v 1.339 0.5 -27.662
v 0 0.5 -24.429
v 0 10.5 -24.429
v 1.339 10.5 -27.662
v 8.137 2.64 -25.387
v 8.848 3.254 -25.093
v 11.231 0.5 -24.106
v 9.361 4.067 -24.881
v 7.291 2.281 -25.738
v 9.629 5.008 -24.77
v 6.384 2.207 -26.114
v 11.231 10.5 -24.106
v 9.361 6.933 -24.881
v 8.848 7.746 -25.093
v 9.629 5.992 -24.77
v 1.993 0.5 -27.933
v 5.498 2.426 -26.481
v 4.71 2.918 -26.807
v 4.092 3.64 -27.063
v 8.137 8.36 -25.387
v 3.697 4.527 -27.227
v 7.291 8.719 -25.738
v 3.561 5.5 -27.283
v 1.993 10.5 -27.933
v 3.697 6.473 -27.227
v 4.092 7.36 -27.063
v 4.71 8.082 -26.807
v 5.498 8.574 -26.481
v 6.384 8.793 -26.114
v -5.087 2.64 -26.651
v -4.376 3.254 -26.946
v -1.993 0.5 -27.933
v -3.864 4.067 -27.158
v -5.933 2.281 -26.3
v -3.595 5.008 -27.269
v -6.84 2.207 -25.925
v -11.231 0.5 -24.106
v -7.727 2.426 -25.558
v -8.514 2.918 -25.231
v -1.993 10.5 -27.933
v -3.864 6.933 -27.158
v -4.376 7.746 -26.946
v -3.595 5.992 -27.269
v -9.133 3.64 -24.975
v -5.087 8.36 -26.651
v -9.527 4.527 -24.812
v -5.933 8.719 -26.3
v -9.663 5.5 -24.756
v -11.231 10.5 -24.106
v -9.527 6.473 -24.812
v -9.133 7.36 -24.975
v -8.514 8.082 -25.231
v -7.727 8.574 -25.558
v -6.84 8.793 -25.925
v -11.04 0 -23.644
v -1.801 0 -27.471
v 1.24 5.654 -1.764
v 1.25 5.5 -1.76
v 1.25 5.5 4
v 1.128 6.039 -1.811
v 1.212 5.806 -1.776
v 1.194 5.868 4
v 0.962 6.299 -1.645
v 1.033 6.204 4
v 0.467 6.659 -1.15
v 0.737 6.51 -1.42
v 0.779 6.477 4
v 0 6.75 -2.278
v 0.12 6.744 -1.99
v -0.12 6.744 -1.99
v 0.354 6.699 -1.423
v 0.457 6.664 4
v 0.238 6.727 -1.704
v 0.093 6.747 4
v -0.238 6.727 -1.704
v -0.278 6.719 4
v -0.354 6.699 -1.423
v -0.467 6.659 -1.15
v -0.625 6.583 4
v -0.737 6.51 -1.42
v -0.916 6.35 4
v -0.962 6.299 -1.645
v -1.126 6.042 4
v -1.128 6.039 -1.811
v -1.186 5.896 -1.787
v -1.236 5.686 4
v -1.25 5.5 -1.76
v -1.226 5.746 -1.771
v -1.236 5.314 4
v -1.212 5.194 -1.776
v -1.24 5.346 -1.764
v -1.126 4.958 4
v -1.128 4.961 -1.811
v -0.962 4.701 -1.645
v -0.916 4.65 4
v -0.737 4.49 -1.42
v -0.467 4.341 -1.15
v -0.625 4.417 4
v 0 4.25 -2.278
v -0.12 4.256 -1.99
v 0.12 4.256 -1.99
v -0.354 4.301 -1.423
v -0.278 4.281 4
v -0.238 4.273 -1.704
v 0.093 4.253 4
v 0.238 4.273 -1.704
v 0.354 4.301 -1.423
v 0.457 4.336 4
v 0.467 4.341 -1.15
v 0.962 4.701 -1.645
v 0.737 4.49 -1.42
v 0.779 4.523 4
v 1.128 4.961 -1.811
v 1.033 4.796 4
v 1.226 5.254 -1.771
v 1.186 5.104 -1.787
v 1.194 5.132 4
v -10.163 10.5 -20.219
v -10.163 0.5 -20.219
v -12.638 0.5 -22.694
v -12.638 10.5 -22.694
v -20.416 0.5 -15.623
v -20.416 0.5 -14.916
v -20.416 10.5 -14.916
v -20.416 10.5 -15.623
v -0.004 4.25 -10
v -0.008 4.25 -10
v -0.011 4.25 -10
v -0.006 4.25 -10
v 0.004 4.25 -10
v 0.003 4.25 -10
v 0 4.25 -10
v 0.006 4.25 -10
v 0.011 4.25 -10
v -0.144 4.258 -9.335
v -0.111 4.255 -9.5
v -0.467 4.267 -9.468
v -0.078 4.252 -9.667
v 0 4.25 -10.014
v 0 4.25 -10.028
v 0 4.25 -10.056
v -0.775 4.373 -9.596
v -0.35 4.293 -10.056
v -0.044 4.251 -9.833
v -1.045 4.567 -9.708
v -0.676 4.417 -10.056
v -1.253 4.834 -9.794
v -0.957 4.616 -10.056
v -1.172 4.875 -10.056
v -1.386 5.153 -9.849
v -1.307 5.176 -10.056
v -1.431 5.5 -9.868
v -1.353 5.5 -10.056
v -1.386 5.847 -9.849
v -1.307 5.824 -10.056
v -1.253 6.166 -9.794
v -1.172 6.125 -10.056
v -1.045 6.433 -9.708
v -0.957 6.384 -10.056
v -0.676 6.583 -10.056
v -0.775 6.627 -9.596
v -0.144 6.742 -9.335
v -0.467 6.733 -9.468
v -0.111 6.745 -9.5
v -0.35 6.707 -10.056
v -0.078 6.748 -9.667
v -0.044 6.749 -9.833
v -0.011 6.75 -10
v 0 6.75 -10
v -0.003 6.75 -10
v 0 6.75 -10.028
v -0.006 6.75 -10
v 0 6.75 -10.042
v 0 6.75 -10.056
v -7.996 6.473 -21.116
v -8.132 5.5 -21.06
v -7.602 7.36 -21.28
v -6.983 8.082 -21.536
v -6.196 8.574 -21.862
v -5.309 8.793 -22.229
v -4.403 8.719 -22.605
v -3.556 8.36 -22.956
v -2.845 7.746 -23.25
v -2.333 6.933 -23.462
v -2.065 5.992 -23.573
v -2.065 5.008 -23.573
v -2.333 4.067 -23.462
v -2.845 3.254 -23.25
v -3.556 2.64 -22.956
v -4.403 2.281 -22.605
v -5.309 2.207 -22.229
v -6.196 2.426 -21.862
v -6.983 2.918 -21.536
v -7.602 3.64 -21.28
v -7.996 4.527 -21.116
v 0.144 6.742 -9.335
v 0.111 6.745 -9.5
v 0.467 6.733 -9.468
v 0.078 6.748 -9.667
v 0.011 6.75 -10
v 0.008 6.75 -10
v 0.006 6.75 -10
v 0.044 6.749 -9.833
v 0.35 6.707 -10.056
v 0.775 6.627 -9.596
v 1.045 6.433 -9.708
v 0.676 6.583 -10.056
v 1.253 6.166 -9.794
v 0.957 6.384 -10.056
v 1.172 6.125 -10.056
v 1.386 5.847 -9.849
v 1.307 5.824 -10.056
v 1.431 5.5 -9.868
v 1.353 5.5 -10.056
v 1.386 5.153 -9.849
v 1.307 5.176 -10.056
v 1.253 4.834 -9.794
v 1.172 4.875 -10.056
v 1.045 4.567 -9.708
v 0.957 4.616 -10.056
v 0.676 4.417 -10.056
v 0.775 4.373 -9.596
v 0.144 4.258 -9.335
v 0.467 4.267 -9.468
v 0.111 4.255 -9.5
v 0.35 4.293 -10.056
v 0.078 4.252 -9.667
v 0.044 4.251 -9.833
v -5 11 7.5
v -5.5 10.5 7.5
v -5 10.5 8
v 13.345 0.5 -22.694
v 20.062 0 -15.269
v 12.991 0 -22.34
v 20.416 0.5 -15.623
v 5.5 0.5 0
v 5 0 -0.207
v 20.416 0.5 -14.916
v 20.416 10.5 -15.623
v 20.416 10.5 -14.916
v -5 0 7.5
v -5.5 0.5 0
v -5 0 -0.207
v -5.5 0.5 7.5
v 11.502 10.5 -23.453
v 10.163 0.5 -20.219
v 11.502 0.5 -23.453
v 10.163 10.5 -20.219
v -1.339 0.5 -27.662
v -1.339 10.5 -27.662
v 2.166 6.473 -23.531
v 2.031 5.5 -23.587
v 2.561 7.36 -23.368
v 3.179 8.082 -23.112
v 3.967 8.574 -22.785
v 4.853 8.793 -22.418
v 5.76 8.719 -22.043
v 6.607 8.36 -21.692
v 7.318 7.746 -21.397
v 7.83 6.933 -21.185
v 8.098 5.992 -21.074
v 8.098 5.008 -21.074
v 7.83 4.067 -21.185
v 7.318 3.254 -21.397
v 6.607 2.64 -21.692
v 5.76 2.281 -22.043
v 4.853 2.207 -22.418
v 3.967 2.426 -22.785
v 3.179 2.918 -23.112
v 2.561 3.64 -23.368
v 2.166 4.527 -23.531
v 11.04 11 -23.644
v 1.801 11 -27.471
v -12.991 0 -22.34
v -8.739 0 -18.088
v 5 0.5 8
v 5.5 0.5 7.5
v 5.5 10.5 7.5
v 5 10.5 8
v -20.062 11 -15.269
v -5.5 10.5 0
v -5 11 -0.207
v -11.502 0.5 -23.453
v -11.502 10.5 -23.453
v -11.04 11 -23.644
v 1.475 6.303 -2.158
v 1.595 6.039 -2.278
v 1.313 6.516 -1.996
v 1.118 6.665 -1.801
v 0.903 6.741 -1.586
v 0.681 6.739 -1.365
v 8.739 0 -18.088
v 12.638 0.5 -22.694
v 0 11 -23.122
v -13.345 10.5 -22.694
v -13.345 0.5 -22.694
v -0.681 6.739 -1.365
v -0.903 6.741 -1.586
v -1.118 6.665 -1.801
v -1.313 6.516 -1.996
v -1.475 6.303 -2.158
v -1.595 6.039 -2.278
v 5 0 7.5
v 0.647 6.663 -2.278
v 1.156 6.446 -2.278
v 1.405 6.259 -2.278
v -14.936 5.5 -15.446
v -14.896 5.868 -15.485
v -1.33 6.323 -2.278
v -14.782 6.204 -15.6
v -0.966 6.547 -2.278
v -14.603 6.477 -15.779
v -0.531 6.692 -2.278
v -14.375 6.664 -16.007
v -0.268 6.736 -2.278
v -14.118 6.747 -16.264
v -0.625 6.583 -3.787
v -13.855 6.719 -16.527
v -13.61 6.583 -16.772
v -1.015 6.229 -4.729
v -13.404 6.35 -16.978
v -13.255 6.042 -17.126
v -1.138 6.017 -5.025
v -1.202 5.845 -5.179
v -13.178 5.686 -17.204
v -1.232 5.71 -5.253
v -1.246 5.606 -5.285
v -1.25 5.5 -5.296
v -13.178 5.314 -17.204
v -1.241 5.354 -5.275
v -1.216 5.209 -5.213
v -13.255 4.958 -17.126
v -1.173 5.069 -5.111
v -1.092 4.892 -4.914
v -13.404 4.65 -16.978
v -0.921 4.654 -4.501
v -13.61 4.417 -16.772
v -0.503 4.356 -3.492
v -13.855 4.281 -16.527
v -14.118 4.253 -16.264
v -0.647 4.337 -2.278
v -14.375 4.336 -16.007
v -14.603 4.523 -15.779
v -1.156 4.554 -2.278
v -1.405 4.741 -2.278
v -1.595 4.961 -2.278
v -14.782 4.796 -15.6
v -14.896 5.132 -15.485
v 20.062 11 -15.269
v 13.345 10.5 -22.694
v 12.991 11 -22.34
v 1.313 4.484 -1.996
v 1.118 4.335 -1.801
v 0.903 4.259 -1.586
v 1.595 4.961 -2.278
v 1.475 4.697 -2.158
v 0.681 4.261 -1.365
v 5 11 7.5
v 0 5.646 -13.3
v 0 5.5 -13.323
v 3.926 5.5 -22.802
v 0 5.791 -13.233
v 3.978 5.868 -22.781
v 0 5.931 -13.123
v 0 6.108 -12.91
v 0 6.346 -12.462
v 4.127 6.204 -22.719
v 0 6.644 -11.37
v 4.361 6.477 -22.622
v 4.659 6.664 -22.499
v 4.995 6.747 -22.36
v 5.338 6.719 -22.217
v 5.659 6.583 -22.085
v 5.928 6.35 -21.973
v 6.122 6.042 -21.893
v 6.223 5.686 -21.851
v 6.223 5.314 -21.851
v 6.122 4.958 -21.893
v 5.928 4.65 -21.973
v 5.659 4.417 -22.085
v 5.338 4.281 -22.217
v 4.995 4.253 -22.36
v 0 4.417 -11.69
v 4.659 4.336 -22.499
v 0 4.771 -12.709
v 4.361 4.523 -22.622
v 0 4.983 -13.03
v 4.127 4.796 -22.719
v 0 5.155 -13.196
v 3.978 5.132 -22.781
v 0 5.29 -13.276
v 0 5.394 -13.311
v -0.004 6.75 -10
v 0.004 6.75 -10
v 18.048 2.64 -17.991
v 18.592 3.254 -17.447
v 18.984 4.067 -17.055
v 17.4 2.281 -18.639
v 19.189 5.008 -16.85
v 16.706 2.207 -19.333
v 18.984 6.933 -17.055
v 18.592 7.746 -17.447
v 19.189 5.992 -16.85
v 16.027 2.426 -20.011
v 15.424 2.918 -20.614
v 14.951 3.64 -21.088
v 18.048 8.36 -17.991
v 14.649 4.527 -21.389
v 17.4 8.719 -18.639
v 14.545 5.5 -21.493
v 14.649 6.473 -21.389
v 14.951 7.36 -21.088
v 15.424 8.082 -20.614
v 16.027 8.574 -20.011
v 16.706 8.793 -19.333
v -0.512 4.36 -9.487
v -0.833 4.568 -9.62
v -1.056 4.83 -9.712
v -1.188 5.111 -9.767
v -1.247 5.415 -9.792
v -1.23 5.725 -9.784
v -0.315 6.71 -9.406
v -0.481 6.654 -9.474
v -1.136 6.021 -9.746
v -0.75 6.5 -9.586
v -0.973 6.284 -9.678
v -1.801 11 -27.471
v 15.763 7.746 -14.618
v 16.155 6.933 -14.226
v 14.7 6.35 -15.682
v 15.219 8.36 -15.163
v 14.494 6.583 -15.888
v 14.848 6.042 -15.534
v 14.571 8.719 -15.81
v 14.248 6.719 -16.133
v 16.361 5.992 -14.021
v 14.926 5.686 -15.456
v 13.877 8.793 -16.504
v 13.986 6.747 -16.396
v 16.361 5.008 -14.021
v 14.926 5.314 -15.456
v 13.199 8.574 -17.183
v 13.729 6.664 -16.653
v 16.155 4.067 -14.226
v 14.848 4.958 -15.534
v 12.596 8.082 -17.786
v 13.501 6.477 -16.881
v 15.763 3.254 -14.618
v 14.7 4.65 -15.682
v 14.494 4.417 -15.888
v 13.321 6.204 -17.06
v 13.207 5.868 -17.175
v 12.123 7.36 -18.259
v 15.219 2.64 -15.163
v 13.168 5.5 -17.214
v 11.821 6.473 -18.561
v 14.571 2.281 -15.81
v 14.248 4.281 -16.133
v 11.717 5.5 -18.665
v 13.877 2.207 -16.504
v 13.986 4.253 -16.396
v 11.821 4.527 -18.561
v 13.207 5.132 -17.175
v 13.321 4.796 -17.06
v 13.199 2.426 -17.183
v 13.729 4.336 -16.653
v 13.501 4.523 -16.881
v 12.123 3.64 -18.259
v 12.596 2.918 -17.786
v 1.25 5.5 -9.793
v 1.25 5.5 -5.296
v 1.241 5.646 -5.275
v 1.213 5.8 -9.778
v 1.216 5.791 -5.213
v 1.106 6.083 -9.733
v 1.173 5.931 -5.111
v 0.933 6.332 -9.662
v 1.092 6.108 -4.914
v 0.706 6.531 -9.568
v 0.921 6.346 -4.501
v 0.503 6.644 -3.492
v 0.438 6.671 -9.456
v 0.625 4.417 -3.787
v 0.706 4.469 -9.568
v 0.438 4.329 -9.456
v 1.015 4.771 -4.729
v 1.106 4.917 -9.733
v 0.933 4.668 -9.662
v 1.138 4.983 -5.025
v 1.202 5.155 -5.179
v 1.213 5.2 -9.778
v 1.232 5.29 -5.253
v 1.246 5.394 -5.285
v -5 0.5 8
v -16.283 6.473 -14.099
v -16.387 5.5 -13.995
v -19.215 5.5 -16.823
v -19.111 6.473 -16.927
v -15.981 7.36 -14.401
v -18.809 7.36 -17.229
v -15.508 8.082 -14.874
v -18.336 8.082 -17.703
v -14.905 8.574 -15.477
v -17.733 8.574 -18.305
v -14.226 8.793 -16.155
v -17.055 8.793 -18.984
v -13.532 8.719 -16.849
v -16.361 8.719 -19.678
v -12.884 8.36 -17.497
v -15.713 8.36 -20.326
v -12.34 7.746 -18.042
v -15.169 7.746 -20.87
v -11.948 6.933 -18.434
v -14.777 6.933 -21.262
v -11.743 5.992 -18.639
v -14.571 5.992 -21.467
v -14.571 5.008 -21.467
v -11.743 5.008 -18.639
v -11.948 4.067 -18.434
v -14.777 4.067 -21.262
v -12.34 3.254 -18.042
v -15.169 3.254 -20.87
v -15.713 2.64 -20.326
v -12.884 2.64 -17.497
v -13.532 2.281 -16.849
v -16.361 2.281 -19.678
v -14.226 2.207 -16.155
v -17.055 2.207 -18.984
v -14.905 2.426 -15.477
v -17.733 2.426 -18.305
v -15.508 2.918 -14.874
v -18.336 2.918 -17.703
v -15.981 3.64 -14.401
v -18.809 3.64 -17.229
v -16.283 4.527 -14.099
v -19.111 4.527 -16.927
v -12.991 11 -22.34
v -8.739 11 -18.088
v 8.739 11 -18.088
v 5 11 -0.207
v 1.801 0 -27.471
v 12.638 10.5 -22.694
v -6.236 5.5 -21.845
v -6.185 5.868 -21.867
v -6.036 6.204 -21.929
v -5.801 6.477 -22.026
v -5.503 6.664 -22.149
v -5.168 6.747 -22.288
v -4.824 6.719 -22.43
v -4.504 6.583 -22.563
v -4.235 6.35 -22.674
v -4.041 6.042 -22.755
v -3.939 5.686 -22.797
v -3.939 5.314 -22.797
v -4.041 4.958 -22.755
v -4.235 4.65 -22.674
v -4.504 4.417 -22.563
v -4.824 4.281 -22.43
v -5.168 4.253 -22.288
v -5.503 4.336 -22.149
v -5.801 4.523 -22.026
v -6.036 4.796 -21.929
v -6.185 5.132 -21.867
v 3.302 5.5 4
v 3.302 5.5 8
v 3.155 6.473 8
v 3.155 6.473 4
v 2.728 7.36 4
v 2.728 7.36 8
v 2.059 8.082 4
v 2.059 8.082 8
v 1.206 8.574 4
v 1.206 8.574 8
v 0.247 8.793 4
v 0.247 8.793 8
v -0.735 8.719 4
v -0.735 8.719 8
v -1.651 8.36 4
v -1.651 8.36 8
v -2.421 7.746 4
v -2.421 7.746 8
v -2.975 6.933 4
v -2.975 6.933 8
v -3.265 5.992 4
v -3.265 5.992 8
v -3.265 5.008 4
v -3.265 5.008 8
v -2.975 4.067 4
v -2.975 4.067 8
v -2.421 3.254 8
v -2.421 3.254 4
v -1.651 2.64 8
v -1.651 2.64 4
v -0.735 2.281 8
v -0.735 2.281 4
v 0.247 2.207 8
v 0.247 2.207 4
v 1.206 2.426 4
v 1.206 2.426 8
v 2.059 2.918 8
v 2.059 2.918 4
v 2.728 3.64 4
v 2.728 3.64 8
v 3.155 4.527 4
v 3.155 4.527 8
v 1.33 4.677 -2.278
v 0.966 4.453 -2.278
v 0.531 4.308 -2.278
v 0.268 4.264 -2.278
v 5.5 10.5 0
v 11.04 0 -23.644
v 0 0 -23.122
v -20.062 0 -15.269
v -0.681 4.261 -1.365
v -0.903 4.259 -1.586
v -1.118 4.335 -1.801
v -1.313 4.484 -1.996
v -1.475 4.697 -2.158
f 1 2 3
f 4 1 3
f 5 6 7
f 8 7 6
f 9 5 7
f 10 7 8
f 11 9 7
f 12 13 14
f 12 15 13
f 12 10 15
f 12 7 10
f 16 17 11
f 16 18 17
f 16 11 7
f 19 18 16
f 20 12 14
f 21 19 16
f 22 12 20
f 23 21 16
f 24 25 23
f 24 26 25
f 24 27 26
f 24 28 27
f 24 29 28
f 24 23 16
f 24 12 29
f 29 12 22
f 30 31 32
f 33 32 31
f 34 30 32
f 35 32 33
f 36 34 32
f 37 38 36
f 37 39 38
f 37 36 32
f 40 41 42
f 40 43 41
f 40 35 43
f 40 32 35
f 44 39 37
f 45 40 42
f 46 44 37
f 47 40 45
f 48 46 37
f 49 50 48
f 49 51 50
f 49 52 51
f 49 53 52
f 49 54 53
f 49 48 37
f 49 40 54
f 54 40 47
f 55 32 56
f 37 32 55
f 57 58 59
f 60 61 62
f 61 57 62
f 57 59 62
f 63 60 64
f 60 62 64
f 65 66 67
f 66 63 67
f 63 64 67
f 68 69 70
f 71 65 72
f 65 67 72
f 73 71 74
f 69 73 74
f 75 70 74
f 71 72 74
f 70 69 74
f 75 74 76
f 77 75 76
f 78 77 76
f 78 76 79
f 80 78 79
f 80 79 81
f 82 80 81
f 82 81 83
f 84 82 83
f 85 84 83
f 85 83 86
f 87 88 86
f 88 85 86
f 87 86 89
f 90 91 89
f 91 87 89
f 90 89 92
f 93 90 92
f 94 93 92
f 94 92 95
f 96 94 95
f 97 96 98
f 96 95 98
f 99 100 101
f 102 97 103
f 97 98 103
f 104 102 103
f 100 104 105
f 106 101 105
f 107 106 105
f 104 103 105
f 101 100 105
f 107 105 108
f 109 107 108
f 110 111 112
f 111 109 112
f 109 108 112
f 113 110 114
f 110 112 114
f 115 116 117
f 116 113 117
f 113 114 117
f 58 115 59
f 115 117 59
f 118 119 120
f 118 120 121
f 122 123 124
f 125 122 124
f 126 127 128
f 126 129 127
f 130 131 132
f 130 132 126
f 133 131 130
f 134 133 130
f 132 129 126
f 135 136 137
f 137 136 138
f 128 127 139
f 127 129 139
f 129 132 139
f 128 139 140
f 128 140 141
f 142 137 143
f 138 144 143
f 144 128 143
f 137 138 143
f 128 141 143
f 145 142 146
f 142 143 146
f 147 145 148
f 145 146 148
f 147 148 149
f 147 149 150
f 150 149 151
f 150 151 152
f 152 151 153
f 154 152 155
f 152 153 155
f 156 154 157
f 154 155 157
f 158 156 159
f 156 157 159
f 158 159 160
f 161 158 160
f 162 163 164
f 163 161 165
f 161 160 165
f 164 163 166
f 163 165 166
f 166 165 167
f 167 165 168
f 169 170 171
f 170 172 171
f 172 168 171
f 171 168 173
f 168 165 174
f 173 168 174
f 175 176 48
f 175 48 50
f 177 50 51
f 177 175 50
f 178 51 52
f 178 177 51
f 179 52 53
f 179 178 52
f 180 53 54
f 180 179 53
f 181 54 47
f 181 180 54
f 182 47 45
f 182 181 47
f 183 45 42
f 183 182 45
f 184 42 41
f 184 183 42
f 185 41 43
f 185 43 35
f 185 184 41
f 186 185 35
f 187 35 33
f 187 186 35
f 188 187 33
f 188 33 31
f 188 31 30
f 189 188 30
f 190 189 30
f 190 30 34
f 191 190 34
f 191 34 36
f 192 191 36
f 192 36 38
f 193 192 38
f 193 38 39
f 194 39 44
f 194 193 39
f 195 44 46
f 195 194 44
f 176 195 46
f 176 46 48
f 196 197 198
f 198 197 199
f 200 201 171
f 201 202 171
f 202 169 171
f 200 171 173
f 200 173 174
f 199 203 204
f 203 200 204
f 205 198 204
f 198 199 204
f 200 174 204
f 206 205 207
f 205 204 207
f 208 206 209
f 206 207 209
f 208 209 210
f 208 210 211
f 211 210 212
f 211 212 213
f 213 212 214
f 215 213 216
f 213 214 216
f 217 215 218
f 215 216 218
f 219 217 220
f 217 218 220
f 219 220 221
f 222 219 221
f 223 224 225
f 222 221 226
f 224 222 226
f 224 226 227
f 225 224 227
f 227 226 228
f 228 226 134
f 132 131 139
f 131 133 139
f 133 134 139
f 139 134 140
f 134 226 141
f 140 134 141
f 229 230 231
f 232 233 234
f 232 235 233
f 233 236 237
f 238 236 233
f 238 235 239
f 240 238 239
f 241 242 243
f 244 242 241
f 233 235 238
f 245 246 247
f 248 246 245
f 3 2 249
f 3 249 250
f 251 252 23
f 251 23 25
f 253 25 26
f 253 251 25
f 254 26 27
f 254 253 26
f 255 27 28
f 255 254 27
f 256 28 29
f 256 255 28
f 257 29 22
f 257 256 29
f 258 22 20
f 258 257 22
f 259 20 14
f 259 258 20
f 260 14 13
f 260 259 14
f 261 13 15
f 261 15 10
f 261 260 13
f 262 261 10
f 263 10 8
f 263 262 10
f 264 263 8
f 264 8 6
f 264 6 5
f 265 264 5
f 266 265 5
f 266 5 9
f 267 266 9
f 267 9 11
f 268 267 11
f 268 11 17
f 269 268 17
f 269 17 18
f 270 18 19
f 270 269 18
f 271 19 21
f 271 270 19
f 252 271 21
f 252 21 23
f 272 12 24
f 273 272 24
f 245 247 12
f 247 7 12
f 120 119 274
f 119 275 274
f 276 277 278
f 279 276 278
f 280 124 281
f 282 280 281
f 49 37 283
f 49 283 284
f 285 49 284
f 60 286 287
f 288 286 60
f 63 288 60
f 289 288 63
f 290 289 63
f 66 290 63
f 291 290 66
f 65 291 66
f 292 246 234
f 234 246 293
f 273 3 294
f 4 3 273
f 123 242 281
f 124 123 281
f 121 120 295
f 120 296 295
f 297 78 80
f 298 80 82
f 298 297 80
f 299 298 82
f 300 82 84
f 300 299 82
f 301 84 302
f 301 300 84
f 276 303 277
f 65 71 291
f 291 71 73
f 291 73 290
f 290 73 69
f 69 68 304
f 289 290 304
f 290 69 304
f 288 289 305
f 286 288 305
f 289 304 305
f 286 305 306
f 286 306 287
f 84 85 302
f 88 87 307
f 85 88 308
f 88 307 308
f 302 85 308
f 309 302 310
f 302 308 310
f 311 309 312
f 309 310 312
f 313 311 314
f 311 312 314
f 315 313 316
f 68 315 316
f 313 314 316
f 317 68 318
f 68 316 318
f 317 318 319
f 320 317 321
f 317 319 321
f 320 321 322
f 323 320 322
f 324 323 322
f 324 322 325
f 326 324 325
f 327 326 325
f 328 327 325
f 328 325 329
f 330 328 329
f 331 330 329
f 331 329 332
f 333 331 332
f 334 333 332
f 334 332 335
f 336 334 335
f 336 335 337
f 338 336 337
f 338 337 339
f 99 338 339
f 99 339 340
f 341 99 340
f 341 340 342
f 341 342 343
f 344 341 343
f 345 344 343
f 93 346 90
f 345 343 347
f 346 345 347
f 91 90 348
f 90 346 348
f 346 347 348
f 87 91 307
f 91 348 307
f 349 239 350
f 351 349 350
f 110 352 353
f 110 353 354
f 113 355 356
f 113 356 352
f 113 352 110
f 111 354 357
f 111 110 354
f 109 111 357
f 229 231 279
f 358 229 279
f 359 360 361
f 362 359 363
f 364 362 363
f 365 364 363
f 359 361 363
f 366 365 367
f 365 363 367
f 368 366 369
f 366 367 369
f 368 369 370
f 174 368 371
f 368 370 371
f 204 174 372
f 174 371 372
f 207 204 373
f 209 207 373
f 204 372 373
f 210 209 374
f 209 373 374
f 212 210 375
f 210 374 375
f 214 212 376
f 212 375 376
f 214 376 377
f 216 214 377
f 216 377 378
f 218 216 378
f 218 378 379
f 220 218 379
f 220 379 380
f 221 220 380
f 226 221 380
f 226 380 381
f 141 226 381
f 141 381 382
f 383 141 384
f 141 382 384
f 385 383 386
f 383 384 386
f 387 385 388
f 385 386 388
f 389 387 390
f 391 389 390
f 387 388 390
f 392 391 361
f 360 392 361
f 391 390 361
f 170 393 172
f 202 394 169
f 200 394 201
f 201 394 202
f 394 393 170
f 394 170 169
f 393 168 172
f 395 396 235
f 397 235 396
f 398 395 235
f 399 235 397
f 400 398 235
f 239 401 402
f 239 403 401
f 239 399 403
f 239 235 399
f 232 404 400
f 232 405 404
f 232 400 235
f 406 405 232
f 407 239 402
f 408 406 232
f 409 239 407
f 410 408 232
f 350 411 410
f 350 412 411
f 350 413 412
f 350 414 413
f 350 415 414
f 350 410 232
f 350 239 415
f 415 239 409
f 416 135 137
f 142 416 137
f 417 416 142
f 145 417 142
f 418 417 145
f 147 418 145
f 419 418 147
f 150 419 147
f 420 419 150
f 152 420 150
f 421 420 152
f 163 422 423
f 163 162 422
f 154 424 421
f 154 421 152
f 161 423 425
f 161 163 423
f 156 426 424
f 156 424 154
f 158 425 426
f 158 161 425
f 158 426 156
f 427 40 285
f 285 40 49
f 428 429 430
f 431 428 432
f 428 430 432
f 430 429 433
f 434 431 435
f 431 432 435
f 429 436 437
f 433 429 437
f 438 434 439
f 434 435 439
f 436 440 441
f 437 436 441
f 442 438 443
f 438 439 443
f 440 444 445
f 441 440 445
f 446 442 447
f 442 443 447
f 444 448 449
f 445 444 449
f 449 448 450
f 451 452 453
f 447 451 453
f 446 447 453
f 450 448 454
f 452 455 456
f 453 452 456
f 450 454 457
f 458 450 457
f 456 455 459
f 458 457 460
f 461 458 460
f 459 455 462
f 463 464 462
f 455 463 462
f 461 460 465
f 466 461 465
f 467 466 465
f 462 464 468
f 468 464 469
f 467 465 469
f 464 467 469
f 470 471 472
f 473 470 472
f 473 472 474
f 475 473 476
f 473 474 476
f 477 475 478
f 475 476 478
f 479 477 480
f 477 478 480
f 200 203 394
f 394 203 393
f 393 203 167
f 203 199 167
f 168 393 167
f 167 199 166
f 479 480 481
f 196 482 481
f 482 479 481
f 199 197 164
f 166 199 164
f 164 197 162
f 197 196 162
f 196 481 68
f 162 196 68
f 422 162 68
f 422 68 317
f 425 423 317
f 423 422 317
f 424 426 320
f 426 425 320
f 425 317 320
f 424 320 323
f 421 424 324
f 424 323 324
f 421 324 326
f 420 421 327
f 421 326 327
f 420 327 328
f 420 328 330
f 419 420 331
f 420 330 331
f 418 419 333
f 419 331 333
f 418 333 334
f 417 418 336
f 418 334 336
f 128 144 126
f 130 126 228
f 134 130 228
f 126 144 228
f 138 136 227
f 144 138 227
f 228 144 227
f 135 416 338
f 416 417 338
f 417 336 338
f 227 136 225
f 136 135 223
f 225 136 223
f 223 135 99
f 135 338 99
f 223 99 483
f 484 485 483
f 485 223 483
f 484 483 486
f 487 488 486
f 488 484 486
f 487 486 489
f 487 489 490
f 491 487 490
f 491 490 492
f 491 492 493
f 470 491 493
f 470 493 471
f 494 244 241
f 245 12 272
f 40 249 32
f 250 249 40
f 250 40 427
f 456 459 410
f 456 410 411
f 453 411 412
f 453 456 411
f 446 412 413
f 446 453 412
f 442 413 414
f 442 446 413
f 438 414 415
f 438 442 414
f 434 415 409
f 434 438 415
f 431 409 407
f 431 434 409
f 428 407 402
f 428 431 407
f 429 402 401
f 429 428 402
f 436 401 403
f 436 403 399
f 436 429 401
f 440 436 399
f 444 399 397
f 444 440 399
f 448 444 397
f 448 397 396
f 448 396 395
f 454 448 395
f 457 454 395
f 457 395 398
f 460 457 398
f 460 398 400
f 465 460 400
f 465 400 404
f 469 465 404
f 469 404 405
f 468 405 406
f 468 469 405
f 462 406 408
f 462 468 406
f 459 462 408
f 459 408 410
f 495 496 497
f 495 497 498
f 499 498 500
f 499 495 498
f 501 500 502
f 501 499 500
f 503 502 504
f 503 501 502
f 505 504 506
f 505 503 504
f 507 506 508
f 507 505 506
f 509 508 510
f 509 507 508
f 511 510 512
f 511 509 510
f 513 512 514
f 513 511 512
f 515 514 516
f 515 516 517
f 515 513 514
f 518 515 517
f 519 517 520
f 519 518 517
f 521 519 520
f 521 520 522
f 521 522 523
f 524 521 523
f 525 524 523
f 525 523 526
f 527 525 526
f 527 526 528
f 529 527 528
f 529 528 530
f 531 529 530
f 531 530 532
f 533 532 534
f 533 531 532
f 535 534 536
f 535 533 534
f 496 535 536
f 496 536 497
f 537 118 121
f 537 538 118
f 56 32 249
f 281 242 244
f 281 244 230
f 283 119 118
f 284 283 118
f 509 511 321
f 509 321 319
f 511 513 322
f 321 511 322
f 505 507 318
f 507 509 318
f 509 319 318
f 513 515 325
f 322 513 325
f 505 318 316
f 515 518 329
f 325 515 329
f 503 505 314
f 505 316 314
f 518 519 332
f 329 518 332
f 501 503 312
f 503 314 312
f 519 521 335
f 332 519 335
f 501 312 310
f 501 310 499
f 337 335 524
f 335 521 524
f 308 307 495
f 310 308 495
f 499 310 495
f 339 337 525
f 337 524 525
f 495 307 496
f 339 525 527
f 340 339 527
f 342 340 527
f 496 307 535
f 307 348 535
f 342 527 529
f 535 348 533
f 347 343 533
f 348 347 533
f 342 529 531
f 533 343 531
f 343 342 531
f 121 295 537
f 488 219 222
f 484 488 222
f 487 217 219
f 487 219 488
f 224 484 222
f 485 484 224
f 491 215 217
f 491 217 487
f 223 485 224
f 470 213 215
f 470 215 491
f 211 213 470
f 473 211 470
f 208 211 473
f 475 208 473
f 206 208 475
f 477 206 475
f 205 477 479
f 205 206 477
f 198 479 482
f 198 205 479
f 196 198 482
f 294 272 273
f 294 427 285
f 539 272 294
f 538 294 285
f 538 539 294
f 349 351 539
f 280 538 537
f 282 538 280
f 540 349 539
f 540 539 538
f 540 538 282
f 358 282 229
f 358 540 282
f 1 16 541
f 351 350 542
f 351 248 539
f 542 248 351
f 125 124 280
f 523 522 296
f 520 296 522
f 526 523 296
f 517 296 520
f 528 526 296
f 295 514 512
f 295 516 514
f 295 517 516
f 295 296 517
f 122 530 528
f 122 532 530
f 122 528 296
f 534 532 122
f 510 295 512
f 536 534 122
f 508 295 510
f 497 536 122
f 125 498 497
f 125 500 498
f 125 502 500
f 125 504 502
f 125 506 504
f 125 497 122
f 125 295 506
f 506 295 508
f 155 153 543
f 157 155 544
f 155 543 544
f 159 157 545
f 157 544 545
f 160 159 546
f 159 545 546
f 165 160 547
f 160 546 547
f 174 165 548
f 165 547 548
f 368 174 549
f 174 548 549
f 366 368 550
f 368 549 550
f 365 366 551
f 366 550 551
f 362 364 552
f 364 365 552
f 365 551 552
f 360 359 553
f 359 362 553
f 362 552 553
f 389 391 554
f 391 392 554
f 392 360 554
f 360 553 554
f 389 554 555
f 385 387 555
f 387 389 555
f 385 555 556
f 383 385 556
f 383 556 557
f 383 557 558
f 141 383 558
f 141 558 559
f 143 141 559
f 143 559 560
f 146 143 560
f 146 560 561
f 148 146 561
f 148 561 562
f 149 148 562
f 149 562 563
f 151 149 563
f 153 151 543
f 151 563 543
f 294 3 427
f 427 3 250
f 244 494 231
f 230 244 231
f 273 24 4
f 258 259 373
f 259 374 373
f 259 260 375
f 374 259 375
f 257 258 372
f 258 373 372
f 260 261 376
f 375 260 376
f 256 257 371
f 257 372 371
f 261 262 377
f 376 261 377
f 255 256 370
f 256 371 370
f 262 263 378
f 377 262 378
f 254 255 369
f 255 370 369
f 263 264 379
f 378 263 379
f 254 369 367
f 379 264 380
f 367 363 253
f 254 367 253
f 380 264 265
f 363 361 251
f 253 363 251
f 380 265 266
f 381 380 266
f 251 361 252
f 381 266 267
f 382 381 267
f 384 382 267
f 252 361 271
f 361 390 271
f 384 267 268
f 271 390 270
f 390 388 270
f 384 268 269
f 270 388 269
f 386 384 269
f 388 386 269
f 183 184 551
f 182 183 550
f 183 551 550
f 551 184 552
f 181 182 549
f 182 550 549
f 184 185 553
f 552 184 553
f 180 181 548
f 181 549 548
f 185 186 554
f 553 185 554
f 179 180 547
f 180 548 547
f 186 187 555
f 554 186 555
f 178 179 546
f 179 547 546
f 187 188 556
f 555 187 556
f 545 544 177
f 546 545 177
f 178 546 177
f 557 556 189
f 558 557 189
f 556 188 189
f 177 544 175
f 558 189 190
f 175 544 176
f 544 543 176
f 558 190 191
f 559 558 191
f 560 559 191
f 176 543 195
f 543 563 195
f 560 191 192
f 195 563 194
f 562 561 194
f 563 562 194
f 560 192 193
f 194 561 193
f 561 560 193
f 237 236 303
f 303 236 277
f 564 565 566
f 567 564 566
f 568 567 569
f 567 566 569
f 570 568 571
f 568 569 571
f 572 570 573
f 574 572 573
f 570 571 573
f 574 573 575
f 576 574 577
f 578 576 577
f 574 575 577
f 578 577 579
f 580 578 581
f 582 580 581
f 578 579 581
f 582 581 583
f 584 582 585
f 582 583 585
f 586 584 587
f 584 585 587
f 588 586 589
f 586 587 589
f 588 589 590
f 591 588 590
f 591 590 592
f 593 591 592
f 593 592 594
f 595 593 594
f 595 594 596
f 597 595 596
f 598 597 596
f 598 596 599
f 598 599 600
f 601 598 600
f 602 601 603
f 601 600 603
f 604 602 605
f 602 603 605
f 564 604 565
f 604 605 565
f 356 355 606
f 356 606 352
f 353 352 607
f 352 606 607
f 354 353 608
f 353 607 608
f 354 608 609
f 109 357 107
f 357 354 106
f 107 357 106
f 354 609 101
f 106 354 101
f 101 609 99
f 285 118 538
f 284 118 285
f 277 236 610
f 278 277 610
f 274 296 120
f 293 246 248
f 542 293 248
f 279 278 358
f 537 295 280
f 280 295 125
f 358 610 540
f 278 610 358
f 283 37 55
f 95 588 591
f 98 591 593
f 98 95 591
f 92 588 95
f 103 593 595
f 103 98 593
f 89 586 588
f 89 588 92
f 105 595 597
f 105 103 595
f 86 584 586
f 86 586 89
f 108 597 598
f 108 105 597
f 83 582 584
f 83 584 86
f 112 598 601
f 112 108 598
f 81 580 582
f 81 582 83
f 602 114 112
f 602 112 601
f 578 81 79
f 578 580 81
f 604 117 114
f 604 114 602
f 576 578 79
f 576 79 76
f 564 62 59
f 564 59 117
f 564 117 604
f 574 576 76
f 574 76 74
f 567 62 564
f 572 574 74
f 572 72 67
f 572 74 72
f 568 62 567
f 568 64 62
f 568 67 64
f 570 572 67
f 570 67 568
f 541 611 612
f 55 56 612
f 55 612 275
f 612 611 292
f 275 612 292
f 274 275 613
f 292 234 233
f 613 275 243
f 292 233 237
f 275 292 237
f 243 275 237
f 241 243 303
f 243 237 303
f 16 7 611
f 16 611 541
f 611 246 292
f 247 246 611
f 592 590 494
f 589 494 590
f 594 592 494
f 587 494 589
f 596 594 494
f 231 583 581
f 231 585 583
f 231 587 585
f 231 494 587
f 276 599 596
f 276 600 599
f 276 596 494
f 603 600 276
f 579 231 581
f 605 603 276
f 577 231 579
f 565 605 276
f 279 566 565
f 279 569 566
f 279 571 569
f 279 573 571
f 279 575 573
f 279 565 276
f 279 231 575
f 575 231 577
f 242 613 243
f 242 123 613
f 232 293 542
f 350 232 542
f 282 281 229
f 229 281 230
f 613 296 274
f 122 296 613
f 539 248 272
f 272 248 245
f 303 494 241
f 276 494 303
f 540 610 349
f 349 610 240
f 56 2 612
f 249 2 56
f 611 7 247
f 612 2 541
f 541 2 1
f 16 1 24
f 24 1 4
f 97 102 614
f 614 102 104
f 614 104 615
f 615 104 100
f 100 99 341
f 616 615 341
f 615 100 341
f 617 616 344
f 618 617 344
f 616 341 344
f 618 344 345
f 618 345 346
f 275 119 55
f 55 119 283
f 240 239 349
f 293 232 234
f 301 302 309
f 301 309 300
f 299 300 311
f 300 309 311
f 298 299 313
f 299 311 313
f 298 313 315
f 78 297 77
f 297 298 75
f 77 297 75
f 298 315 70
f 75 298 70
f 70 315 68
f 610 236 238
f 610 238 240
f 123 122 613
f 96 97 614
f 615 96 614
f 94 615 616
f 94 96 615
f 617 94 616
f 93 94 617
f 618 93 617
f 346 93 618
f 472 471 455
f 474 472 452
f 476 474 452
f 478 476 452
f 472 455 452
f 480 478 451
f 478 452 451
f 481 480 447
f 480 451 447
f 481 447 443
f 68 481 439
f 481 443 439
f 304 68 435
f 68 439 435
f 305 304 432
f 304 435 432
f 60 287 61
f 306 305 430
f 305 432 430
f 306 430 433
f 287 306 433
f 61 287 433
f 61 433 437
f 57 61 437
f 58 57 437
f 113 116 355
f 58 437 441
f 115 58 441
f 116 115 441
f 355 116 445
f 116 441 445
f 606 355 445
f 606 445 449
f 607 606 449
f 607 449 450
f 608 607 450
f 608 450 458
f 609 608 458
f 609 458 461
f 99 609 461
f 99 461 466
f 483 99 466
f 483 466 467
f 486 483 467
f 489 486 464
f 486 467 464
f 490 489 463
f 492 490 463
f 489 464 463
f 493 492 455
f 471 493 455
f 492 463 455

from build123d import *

# Parameters (mm, degrees)
BOSS_EXTRUDE1_DEPTH = 11
SKETCH5_R           = 1.25
CUT_EXTRUDE3_DEPTH  = 21
SKETCH6_R           = 1.25
CUT_EXTRUDE4_DEPTH  = 14
SKETCH7_R           = 1.25
CUT_EXTRUDE5_DEPTH  = 14
SKETCH8_R           = 1.25
CUT_EXTRUDE6_DEPTH  = 21
SKETCH9_W           = 11
SKETCH9_H           = 11
BOSS_EXTRUDE2_DEPTH = 8
SKETCH10_R          = 1.25
CUT_EXTRUDE7_DEPTH  = 18
SKETCH12_R          = 3.302
CUT_EXTRUDE9_DEPTH  = 4
SKETCH18_W          = 11
SKETCH18_H          = 11
SKETCH18_R          = 3.302
BOSS_EXTRUDE3_DEPTH = 4
SKETCH19_W          = 11
SKETCH19_H          = 11
SKETCH19_R          = 3.302
BOSS_EXTRUDE4_DEPTH = 4
SKETCH20_W          = 11
SKETCH20_H          = 11
SKETCH20_R          = 3.302
BOSS_EXTRUDE5_DEPTH = 4
SKETCH22_W          = 11
SKETCH22_H          = 11
SKETCH22_R          = 3.302
BOSS_EXTRUDE7_DEPTH = 4
CHAMFER1_SIZE       = 0.5


with BuildPart() as part:
    # Sketch2 → Boss-Extrude1 (new body)
    with BuildSketch(Plane(origin=(0, 0, 0), x_dir=(1, 0, 0), z_dir=(0, 1, 0))):
        Polygon((0, 24.4285418), (-10.162674858, 20.219024044), (-17.940849451, 12.440849451), (-5.5, 0), (5.5, 0), (17.940849451, 12.440849451), (10.162674858, 20.219024044), align=None)
    extrude(amount=BOSS_EXTRUDE1_DEPTH)

    # Sketch5 → Cut-Extrude3 (cut)
    with BuildSketch(Plane(origin=(15.190849451, 0, -15.190849451), x_dir=(-0.707106781, 0, -0.707106781), z_dir=(0.707106781, 0, -0.707106781))):
        with Locations((1.610912703, 5.5)):
            Circle(SKETCH5_R)
    extrude(amount=-CUT_EXTRUDE3_DEPTH, mode=Mode.SUBTRACT)

    # Sketch6 → Cut-Extrude4 (cut)
    with BuildSketch(Plane(origin=(8.636793781, 0, -20.85106468), x_dir=(-0.923879533, 0, -0.382683432), z_dir=(0.382683432, 0, -0.923879533))):
        with Locations((3.848398224, 5.5)):
            Circle(SKETCH6_R)
    extrude(amount=-CUT_EXTRUDE4_DEPTH, mode=Mode.SUBTRACT)

    # Sketch7 → Cut-Extrude5 (cut)
    with BuildSketch(Plane(origin=(-8.636793781, 0, -20.85106468), x_dir=(-0.923879533, 0, 0.382683432), z_dir=(-0.382683432, 0, -0.923879533))):
        with Locations((-3.848398224, 5.5)):
            Circle(SKETCH7_R)
    extrude(amount=-CUT_EXTRUDE5_DEPTH, mode=Mode.SUBTRACT)

    # Sketch8 → Cut-Extrude6 (cut)
    with BuildSketch(Plane(origin=(-15.190849451, 0, -15.190849451), x_dir=(-0.707106781, 0, 0.707106781), z_dir=(-0.707106781, 0, -0.707106781))):
        with Locations((-1.610912703, 5.5)):
            Circle(SKETCH8_R)
    extrude(amount=-CUT_EXTRUDE6_DEPTH, mode=Mode.SUBTRACT)

    # Sketch9 → Boss-Extrude2 (add)
    with BuildSketch(Plane.XY):
        with Locations((0, 5.5)):
            Rectangle(SKETCH9_W, SKETCH9_H)
    extrude(amount=BOSS_EXTRUDE2_DEPTH)

    # Sketch10 → Cut-Extrude7 (cut)
    with BuildSketch(Plane.XY.offset(8)):
        with Locations((0, 5.5)):
            Circle(SKETCH10_R)
    extrude(amount=-CUT_EXTRUDE7_DEPTH, mode=Mode.SUBTRACT)

    # Sketch12 → Cut-Extrude9 (cut)
    with BuildSketch(Plane.XY.offset(8)):
        with Locations((0, 5.5)):
            Circle(SKETCH12_R)
    extrude(amount=-CUT_EXTRUDE9_DEPTH, mode=Mode.SUBTRACT)

    # Sketch18 → Boss-Extrude3 (add)
    with BuildSketch(Plane(origin=(15.190849451, 0, -15.190849451), x_dir=(-0.707106781, 0, -0.707106781), z_dir=(0.707106781, 0, -0.707106781))):
        with Locations((1.610912703, 5.5)):
            Rectangle(SKETCH18_W, SKETCH18_H)
        with Locations((1.610912703, 5.5)):
            Circle(SKETCH18_R, mode=Mode.SUBTRACT)
    extrude(amount=BOSS_EXTRUDE3_DEPTH)

    # Sketch19 → Boss-Extrude4 (add)
    with BuildSketch(Plane(origin=(8.636793781, 0, -20.85106468), x_dir=(-0.923879533, 0, -0.382683432), z_dir=(0.382683432, 0, -0.923879533))):
        with Locations((3.848398224, 5.5)):
            Rectangle(SKETCH19_W, SKETCH19_H)
        with Locations((3.848398224, 5.5)):
            Circle(SKETCH19_R, mode=Mode.SUBTRACT)
    extrude(amount=BOSS_EXTRUDE4_DEPTH)

    # Sketch20 → Boss-Extrude5 (add)
    with BuildSketch(Plane(origin=(-8.636793781, 0, -20.85106468), x_dir=(-0.923879533, 0, 0.382683432), z_dir=(-0.382683432, 0, -0.923879533))):
        with Locations((-3.848398224, 5.5)):
            Rectangle(SKETCH20_W, SKETCH20_H)
        with Locations((-3.848398224, 5.5)):
            Circle(SKETCH20_R, mode=Mode.SUBTRACT)
    extrude(amount=BOSS_EXTRUDE5_DEPTH)

    # Sketch22 → Boss-Extrude7 (add)
    with BuildSketch(Plane(origin=(-15.190849451, 0, -15.190849451), x_dir=(-0.707106781, 0, 0.707106781), z_dir=(-0.707106781, 0, -0.707106781))):
        with Locations((-1.610912703, 5.5)):
            Rectangle(SKETCH22_W, SKETCH22_H)
        with Locations((-1.610912703, 5.5)):
            Circle(SKETCH22_R, mode=Mode.SUBTRACT)
    extrude(amount=BOSS_EXTRUDE7_DEPTH)

    # Chamfer1
    chamfer1_edges = [part.edges().sort_by_distance(p)[0] for p in [
        (16.880189279, 0, -19.158363872),
        (20.769276575, 5.5, -15.269276575),
        (12.991101982, 5.5, -23.047451168),
        (11.57688842, 0, -21.633237606),
        (16.880189279, 11, -19.158363872),
        (11.57688842, 11, -21.633237606),
        (11.693408587, 5.5, -23.914542174),
        (6.612071158, 0, -26.019301052),
        (1.530733729, 5.5, -28.12405993),
        (6.612071158, 11, -26.019301052),
        (10.928041722, 11, -22.066783109),
        (10.928041722, 0, -22.066783109),
        (0.765366865, 0, -26.276300865),
        (0.765366865, 11, -26.276300865),
        (-1.530733729, 5.5, -28.12405993),
        (-6.612071158, 0, -26.019301052),
        (-11.693408587, 5.5, -23.914542174),
        (-6.612071158, 11, -26.019301052),
        (-0.765366865, 11, -26.276300865),
        (-0.765366865, 0, -26.276300865),
        (-10.928041722, 0, -22.066783109),
        (-10.928041722, 11, -22.066783109),
        (-13.134638288, 11, -7.634638288),
        (-12.991101982, 5.5, -23.047451168),
        (-16.880189279, 0, -19.158363872),
        (-20.769276575, 5.5, -15.269276575),
        (-16.880189279, 11, -19.158363872),
        (-11.57688842, 11, -21.633237606),
        (-11.57688842, 0, -21.633237606),
        (13.134638288, 11, -7.634638288),
        (-5.5, 11, 4),
        (-5.5, 0, 4),
        (5.5, 0, 4),
        (5.5, 11, 4),
        (-5.5, 5.5, 8),
        (0, 0, 8),
        (5.5, 5.5, 8),
        (13.134638288, 0, -7.634638288),
        (0, 11, 8),
        (-13.134638288, 0, -7.634638288),
    ]]
    chamfer(chamfer1_edges, length=CHAMFER1_SIZE)


solid = part.part
